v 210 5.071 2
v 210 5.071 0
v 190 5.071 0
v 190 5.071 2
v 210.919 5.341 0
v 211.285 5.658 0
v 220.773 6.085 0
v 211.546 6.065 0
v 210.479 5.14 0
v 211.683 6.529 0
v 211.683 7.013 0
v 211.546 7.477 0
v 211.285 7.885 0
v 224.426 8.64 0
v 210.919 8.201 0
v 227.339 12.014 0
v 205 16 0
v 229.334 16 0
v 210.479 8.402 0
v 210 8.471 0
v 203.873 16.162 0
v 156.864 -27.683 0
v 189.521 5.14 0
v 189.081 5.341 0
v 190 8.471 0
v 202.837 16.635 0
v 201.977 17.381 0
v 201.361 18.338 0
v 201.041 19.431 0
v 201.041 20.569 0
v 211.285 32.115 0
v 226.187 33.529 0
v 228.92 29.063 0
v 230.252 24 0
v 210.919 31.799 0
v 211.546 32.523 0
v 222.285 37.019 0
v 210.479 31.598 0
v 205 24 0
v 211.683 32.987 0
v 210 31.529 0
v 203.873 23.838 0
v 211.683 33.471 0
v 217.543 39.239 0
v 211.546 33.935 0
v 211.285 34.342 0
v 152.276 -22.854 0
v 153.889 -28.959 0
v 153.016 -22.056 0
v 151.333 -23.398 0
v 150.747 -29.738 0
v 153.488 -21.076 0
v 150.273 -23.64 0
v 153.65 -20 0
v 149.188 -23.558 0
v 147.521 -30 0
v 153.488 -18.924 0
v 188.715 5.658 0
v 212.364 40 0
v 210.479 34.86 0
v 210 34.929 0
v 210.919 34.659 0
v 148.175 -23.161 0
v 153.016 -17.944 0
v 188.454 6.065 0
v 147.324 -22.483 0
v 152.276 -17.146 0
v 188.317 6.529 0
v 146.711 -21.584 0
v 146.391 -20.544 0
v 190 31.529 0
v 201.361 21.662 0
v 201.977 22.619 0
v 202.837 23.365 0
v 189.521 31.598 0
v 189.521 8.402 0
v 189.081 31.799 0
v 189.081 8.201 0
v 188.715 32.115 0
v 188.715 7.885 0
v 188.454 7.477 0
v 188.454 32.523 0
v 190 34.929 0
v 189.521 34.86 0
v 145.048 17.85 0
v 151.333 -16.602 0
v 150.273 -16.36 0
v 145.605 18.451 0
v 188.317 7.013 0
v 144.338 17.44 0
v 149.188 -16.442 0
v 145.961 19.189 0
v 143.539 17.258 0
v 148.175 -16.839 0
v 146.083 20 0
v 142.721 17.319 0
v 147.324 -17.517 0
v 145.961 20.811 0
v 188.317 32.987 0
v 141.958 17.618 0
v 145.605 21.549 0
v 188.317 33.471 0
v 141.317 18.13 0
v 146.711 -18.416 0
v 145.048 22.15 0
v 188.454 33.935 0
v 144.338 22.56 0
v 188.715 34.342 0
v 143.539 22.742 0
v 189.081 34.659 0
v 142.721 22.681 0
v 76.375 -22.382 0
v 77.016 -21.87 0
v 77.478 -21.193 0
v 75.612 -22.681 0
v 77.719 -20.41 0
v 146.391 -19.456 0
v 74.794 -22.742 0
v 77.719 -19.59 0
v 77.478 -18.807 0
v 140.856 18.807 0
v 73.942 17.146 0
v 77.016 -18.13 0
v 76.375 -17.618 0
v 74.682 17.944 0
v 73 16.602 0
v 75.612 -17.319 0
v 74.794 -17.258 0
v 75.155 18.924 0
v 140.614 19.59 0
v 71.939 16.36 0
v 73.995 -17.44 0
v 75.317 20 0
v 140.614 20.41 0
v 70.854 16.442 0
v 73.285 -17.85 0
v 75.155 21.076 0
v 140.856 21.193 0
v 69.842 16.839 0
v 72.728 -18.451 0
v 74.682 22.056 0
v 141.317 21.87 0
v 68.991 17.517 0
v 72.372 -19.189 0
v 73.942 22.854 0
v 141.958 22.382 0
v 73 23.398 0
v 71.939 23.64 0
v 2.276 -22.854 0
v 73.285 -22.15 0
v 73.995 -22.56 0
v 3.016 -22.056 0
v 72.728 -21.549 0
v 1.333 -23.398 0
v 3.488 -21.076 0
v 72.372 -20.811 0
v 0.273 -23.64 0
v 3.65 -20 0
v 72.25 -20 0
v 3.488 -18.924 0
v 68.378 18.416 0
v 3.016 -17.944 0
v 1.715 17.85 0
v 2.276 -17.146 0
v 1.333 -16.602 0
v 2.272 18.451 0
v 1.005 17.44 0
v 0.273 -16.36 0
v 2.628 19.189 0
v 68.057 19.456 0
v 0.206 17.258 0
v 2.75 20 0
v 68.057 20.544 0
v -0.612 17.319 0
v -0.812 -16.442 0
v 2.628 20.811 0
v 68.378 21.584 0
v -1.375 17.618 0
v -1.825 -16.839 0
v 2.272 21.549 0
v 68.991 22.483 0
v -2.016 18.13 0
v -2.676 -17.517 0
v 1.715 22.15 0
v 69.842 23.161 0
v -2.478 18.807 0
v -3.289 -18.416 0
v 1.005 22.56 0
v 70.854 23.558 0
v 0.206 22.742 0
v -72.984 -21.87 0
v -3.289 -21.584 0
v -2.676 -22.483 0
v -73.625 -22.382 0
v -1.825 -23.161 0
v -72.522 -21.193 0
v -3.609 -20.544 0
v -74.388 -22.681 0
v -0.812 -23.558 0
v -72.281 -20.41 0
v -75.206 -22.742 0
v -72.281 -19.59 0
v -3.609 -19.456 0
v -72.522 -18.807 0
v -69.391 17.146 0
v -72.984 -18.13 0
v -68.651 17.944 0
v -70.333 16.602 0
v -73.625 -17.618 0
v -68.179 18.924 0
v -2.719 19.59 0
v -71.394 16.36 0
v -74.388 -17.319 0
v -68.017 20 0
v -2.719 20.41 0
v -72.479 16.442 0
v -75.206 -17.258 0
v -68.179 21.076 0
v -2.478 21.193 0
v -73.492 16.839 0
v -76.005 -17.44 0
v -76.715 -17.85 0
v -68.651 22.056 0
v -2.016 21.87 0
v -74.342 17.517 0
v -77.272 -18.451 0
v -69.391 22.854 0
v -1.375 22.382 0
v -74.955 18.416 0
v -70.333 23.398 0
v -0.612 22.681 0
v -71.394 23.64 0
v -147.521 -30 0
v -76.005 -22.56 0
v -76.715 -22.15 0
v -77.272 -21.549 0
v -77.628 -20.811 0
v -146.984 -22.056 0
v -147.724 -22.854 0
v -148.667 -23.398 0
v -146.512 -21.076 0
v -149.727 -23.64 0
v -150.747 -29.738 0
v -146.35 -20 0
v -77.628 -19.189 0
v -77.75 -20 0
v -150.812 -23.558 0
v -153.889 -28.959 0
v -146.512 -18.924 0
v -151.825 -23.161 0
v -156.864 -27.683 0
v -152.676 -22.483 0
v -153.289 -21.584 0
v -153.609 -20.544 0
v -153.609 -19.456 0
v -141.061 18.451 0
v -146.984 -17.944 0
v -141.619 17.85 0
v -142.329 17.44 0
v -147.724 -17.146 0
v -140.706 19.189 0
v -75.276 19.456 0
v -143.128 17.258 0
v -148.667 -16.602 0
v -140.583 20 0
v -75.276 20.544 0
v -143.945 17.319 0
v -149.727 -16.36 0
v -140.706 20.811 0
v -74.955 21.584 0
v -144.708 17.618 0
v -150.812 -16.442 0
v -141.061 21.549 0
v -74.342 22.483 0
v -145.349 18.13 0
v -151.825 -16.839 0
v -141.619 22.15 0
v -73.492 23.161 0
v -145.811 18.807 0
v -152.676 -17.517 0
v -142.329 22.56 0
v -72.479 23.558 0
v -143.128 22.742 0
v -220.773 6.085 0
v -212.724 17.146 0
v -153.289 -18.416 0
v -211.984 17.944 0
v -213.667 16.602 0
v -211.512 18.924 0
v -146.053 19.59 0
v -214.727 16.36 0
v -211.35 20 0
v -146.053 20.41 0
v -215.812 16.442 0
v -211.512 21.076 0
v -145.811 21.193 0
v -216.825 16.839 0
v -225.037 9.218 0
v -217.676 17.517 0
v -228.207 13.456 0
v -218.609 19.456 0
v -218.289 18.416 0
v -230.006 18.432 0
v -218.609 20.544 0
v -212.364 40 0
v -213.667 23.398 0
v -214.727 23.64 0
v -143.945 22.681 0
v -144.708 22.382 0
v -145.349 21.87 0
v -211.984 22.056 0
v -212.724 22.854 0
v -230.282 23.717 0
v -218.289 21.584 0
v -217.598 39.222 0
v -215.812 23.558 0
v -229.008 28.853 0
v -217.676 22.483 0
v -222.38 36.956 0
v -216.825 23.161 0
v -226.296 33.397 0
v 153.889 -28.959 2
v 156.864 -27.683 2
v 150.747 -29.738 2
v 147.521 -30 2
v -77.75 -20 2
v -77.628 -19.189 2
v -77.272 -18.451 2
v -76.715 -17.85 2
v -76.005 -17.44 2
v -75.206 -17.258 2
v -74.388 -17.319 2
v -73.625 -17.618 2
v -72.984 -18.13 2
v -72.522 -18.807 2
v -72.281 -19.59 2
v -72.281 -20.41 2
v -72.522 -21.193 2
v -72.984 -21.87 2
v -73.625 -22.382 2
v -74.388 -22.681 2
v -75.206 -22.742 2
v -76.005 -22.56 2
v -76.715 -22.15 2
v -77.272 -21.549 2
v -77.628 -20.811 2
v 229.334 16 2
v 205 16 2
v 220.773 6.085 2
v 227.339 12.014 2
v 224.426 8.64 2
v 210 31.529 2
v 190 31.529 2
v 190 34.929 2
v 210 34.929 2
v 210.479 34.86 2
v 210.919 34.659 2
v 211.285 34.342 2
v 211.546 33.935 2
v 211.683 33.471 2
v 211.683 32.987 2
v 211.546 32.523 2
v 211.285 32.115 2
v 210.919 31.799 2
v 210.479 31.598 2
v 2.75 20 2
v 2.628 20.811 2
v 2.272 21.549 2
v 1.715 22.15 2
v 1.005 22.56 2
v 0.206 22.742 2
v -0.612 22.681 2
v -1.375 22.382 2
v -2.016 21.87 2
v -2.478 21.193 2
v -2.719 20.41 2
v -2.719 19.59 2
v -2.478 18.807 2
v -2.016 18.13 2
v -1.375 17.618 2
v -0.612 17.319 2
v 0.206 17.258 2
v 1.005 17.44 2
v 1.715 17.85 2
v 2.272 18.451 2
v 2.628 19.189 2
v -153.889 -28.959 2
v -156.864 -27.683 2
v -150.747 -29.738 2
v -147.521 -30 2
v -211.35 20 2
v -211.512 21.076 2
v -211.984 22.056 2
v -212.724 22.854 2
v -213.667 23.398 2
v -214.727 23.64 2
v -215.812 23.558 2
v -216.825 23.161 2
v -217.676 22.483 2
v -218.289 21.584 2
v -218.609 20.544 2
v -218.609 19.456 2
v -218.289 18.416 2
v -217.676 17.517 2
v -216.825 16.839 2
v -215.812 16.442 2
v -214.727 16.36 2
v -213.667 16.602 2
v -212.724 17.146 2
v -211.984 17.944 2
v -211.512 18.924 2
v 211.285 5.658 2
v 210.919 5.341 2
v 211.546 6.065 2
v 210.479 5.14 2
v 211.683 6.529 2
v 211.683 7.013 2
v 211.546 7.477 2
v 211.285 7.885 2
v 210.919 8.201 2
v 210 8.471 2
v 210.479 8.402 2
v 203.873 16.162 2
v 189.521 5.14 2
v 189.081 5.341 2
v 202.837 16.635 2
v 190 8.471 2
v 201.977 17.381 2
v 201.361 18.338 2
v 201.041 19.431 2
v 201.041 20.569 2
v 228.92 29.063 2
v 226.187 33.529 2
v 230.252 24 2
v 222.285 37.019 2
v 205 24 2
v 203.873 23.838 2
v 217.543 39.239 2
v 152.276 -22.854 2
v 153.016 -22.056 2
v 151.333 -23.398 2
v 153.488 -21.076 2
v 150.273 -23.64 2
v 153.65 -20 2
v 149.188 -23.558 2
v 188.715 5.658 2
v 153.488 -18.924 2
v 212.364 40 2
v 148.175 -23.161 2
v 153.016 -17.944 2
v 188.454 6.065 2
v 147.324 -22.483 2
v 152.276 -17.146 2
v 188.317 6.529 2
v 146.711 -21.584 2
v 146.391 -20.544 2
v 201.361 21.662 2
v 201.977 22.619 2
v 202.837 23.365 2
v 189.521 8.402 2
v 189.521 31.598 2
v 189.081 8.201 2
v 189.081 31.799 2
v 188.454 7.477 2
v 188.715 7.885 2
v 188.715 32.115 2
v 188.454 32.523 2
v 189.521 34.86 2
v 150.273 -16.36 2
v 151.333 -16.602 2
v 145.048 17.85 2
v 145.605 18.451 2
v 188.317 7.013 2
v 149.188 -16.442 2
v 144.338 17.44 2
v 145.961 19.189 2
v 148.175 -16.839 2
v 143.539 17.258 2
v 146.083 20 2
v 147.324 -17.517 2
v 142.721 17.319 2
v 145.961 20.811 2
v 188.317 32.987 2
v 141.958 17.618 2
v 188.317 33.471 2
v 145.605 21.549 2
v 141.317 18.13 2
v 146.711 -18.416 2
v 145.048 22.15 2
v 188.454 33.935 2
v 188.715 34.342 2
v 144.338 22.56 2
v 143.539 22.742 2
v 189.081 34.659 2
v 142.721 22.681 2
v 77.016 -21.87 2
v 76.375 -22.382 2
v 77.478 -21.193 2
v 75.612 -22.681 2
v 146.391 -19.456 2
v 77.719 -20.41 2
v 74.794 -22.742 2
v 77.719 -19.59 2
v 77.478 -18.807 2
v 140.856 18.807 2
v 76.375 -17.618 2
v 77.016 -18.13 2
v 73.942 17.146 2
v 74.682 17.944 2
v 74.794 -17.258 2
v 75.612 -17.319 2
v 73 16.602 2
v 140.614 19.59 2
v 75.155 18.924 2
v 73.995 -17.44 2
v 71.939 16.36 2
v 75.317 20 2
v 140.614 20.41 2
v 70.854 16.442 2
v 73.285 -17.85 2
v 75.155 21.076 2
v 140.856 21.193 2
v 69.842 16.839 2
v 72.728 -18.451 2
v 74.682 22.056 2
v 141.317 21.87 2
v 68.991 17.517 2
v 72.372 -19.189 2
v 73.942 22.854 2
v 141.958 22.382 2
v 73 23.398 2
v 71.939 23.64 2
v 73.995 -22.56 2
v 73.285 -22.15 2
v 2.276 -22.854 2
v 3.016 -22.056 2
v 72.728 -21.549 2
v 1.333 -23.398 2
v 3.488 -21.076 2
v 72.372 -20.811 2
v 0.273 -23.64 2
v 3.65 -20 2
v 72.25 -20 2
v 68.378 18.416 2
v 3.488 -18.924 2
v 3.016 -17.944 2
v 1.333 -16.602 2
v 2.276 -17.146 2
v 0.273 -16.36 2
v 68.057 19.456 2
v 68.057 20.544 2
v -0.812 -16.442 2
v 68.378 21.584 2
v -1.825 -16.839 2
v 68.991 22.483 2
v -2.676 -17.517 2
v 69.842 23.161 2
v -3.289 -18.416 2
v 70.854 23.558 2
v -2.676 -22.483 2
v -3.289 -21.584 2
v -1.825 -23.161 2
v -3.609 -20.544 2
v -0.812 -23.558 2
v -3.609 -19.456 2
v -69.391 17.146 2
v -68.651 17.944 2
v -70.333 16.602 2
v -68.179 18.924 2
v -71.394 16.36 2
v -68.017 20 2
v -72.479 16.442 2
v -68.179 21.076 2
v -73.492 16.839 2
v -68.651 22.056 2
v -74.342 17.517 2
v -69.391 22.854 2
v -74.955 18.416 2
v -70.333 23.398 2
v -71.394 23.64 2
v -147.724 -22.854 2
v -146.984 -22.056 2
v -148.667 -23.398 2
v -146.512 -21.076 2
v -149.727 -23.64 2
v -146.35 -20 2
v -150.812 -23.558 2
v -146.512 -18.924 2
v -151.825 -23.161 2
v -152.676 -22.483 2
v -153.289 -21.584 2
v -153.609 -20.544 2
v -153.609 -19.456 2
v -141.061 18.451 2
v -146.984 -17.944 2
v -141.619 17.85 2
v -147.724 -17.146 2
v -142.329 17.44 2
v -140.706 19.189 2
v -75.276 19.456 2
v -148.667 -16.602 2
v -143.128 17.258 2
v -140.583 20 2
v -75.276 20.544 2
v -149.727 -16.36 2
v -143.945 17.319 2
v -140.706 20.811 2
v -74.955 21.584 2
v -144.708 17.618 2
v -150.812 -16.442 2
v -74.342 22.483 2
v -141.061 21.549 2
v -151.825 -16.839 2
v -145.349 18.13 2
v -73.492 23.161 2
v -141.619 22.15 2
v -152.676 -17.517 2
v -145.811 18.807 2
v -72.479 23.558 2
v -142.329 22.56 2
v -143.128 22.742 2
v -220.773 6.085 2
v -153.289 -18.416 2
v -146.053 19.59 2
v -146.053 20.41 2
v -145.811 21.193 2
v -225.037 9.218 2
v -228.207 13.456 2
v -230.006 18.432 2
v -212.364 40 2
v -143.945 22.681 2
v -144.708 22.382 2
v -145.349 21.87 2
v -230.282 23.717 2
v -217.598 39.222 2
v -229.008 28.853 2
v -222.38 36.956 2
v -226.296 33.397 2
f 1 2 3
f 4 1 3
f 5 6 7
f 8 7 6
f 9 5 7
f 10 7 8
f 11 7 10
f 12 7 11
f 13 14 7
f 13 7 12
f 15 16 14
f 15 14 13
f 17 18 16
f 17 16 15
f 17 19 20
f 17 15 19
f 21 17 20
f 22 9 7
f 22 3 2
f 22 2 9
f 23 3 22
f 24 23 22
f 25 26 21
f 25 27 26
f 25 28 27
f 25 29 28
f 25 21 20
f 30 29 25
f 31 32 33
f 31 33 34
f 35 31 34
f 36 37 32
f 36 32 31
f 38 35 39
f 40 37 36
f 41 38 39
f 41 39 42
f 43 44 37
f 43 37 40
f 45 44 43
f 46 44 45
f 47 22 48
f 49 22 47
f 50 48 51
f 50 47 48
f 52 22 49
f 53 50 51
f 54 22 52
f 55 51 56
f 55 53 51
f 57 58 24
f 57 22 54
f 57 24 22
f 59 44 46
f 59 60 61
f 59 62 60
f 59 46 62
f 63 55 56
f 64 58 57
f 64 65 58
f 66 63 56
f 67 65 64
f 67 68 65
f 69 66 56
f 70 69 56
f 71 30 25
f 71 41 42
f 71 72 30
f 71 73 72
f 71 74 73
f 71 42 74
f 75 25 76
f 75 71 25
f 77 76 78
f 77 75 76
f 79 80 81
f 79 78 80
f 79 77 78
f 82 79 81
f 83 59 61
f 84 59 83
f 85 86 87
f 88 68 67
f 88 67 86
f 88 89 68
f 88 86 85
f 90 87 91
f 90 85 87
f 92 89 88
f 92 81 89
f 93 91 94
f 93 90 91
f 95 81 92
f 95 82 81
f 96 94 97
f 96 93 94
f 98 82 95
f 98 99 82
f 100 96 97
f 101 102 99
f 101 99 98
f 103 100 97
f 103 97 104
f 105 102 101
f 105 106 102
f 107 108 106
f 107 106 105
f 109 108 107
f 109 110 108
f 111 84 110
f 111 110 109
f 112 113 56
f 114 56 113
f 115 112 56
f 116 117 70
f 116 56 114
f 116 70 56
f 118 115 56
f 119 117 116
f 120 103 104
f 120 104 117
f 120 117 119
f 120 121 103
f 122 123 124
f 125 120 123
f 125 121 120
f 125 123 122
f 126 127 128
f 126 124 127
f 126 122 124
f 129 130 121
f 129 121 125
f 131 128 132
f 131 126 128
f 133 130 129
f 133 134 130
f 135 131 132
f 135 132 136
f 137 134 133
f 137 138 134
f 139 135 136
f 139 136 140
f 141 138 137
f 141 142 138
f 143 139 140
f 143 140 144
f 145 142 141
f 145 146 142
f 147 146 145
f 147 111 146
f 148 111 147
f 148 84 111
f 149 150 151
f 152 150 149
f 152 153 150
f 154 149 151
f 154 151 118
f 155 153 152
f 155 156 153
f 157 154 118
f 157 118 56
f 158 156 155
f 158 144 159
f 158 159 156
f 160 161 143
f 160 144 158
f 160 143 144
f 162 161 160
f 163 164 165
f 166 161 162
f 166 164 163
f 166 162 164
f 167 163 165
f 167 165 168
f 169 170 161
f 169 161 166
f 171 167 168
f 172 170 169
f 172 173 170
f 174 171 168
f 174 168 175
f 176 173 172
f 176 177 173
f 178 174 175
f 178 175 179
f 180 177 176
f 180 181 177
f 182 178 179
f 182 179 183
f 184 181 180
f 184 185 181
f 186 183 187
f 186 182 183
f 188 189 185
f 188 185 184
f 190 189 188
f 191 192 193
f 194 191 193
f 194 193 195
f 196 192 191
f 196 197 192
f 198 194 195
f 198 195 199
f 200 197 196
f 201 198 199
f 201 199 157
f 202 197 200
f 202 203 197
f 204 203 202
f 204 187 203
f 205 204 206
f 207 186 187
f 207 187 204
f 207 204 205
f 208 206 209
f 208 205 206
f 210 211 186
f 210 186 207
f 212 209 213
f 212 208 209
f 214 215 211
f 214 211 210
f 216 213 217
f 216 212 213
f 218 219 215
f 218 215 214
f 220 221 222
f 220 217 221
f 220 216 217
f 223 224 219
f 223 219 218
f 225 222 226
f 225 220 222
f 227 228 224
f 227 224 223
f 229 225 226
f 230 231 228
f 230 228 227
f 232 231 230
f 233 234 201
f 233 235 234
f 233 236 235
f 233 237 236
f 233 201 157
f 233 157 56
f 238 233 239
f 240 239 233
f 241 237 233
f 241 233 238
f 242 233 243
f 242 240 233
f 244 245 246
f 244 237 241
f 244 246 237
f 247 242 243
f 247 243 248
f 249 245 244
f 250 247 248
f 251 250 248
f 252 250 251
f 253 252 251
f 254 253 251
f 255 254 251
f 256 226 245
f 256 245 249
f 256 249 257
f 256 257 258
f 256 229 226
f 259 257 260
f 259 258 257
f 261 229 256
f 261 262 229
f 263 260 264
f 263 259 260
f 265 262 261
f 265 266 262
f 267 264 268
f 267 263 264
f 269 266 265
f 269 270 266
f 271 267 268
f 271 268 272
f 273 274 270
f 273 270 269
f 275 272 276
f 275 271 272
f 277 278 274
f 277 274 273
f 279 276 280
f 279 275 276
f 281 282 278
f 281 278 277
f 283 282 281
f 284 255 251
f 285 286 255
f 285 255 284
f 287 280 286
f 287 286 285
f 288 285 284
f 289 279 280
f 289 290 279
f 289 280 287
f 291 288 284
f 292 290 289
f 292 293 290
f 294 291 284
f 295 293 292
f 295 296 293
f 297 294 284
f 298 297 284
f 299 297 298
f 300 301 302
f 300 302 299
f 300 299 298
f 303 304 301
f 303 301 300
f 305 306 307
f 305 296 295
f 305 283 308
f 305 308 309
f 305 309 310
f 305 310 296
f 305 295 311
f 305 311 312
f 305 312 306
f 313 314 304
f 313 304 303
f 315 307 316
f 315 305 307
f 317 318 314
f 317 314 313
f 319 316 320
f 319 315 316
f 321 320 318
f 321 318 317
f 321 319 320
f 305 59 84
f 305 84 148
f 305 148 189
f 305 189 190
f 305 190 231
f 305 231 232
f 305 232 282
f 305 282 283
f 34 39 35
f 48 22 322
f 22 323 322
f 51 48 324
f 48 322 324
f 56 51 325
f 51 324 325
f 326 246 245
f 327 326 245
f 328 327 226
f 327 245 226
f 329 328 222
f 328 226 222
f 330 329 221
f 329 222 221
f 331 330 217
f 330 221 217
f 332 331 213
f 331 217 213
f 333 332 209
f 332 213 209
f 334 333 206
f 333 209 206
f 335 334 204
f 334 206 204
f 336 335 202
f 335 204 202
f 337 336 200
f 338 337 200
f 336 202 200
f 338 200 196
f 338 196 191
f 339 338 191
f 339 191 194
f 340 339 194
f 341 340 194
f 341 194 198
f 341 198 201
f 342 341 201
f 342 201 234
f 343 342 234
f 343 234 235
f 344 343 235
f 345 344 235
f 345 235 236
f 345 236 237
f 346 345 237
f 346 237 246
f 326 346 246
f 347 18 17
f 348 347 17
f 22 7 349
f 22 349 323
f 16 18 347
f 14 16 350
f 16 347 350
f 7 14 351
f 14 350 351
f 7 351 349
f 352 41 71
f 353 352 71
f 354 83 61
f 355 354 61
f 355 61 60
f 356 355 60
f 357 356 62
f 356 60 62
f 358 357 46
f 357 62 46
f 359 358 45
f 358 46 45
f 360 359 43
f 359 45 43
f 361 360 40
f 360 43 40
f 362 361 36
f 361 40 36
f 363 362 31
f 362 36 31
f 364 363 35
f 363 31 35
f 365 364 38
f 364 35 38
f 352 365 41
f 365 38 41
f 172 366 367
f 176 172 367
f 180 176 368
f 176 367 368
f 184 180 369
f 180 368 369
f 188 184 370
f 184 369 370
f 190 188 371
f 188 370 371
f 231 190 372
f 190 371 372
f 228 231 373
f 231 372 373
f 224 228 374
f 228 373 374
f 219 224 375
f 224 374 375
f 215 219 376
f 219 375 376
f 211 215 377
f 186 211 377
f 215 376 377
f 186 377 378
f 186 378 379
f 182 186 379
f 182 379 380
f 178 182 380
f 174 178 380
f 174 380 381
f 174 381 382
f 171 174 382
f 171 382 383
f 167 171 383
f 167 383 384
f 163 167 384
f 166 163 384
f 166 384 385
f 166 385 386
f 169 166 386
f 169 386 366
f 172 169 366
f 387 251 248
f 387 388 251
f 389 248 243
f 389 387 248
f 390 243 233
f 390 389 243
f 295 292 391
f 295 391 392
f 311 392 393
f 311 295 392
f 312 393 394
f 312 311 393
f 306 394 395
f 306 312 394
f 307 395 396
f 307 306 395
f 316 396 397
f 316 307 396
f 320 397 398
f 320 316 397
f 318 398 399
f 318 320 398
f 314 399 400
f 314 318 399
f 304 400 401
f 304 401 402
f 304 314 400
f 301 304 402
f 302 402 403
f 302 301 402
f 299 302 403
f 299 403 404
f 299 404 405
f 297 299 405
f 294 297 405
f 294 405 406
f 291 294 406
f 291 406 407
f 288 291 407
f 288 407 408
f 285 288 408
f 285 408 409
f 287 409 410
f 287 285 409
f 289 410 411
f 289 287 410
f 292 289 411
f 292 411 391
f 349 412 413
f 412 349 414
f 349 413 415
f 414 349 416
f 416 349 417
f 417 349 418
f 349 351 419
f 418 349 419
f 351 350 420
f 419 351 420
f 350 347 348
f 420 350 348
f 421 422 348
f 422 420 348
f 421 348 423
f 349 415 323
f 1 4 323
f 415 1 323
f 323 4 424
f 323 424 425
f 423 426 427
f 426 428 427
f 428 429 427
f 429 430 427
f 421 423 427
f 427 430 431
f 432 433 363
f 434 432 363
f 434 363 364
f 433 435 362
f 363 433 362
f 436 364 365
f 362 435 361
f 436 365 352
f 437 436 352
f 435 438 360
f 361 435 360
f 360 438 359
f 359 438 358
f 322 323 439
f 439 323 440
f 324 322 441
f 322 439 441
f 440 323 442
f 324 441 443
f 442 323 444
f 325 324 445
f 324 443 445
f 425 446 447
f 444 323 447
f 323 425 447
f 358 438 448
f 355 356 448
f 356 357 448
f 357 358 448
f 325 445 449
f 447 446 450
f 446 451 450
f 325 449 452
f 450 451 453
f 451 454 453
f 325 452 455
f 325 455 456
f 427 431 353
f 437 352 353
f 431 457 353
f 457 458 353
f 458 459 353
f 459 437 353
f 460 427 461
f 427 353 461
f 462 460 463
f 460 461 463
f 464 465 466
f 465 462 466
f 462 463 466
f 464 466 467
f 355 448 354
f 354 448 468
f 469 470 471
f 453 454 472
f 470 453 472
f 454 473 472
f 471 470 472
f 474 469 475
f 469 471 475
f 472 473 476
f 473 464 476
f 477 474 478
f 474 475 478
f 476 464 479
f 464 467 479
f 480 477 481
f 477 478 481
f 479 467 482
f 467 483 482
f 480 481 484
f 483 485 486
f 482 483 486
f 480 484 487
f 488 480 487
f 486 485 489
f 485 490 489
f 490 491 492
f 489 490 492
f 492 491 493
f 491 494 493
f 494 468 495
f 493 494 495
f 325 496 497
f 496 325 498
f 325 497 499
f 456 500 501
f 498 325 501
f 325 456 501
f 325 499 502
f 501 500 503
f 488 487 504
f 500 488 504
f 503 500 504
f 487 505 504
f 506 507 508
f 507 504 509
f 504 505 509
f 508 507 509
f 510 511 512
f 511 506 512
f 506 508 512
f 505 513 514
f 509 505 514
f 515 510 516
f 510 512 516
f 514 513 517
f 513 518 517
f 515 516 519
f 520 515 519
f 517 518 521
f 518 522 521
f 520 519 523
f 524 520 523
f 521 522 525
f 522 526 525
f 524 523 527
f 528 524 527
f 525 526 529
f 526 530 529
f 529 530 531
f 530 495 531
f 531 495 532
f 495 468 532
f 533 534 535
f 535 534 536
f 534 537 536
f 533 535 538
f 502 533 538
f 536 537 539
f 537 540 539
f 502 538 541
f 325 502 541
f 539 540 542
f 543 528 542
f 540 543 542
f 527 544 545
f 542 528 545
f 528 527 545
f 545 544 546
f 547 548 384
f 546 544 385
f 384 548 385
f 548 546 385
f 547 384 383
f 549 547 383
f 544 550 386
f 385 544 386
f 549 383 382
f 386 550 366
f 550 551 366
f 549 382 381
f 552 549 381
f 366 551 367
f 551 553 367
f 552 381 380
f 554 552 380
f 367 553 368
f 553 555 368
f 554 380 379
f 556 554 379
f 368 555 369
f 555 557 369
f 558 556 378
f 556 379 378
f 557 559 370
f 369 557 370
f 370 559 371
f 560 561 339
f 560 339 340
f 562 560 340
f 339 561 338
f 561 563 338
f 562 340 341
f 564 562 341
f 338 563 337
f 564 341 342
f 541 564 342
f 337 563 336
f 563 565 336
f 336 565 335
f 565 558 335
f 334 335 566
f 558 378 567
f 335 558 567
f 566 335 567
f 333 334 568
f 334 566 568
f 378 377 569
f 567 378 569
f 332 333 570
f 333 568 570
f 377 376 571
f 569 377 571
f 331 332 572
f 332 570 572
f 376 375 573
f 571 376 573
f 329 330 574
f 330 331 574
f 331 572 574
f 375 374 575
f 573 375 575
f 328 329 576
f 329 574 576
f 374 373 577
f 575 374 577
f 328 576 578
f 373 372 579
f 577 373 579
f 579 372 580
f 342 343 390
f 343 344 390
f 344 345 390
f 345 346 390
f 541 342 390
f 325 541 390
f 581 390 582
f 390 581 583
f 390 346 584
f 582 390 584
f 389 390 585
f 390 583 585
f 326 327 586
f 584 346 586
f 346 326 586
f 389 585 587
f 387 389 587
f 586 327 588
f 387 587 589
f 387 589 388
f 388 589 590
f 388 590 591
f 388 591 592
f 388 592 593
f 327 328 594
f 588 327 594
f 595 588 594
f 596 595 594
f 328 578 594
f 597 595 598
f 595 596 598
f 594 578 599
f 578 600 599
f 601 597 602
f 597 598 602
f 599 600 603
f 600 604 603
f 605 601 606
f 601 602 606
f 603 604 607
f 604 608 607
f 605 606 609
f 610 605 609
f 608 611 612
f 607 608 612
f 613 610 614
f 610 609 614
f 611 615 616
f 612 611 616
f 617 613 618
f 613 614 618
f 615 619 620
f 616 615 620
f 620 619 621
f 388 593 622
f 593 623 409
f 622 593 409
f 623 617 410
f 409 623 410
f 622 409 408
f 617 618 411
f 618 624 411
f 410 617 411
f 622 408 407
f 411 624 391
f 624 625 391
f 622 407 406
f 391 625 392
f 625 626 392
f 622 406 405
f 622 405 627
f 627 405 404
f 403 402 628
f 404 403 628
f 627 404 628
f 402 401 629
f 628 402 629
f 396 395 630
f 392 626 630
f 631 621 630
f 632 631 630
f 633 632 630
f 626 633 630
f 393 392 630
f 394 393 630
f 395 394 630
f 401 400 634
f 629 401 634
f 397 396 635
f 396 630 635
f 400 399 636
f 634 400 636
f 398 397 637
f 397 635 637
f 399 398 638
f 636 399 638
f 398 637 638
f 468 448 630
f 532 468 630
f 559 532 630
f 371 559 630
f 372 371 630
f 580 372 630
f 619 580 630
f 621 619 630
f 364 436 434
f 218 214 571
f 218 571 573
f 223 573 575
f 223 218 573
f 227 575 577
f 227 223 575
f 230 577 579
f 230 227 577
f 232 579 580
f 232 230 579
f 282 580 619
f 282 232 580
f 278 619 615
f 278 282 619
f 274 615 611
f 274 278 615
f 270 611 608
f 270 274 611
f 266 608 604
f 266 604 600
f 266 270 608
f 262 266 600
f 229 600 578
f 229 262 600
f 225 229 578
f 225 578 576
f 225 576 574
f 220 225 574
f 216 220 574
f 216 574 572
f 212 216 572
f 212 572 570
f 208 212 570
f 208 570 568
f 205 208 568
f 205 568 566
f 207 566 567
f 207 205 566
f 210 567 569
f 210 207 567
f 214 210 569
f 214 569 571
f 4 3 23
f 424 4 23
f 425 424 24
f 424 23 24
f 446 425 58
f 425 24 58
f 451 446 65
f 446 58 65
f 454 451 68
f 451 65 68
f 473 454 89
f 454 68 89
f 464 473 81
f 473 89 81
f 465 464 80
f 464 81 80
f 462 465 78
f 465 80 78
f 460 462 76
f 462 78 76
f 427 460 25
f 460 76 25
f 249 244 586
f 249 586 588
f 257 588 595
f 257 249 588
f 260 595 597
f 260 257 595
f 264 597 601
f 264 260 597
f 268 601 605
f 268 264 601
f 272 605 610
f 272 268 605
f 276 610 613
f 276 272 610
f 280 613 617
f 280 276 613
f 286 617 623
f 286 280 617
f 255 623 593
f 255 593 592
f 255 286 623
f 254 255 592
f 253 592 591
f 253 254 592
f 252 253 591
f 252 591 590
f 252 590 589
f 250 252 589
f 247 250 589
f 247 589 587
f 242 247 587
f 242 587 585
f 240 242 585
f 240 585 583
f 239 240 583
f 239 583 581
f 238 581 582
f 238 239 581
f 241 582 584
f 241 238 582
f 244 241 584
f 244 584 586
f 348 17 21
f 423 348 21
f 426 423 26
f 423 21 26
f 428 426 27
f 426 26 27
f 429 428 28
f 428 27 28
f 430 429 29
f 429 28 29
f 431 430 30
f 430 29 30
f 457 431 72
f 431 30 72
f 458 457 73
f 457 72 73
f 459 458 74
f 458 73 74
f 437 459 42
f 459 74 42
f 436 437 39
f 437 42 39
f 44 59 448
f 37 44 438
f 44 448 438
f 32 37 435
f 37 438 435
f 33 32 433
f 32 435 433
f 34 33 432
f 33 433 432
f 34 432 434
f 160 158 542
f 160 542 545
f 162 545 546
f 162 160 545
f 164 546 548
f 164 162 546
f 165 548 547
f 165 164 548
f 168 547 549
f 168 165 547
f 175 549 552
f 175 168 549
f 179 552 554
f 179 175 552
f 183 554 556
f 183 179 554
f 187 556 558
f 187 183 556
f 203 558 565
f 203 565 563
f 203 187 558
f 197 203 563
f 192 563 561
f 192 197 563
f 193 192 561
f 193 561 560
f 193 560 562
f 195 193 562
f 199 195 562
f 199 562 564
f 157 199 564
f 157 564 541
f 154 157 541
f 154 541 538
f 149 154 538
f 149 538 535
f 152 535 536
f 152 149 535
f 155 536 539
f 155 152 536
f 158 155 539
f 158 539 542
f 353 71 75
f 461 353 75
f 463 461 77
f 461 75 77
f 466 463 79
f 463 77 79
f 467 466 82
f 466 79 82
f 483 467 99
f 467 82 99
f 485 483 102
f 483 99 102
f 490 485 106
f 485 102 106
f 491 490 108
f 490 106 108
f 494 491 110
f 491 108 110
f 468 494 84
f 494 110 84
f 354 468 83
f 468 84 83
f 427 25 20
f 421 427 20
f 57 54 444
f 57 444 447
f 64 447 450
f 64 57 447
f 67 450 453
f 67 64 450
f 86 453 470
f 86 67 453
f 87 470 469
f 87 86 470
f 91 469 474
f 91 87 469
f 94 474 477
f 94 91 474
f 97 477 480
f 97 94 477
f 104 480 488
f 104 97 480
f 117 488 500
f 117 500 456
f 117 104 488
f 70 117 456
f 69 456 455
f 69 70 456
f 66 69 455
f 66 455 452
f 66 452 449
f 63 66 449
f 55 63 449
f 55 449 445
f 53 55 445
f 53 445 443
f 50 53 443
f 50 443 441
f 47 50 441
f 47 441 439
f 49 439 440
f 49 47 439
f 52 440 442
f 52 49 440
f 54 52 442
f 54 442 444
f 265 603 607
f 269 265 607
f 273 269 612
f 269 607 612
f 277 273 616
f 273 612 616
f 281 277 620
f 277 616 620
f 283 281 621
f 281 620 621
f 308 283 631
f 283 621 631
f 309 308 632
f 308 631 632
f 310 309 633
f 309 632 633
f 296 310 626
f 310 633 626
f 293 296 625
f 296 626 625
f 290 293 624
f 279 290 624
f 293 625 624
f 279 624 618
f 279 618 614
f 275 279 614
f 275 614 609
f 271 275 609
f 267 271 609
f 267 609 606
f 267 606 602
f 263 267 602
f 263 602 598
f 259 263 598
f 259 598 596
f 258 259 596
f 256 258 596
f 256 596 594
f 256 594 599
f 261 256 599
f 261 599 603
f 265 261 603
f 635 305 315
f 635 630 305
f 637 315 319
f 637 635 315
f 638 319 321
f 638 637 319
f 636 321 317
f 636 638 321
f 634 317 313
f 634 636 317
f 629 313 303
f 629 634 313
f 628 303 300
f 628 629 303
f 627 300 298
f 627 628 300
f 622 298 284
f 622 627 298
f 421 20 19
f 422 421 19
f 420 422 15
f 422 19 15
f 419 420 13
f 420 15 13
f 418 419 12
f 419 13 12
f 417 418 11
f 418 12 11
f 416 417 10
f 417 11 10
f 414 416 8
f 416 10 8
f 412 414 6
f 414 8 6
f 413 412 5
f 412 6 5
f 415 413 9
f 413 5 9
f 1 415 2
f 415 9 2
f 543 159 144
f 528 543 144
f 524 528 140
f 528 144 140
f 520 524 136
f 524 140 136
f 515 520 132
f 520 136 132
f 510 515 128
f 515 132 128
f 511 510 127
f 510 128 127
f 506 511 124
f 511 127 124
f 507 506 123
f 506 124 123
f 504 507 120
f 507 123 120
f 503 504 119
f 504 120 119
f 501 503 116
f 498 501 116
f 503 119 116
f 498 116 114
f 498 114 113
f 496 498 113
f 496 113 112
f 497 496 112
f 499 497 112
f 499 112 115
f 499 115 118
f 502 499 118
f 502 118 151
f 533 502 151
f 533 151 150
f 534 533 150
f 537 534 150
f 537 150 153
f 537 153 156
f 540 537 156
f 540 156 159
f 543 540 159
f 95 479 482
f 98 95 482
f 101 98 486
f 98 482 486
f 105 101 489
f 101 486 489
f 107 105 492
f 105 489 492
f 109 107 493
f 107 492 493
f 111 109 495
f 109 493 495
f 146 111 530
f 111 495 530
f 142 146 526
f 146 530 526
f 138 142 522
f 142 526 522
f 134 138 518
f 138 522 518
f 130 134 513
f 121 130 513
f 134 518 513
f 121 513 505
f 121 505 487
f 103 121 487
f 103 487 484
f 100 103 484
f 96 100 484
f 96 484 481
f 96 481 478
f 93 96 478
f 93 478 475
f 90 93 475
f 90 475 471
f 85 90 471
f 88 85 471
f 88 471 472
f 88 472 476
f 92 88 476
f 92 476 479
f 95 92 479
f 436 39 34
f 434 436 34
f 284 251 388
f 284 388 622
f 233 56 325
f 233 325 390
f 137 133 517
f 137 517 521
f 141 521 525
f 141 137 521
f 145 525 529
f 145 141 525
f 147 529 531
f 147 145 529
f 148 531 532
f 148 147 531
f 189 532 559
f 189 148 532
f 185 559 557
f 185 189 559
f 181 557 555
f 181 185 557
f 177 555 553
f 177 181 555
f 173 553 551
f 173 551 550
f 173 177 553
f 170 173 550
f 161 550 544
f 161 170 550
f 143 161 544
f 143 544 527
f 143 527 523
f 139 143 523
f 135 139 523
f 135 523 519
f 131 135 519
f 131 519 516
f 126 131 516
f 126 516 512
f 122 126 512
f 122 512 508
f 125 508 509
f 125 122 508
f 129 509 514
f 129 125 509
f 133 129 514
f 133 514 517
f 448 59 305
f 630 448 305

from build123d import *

# Parameters (mm, degrees)
ESQUISSE1_R             = 3.65
BOSS_EXTRU_1_DEPTH      = 2
CONG_1_R                = 18
CONG_2_R                = 20
D_GAGEMENT_M31_D        = 3.4
ENL_V_MAT_EXTRU_1_DEPTH = 234.819122898
D_GAGEMENT_M51_D        = 5.5
D_GAGEMENT_M52_D        = 5.5


with BuildPart() as part:
    # Esquisse1 → Boss.-Extru.1 (new body)
    with BuildSketch(Plane.XY):
        Polygon((-284.958991582, 40), (-150, 40), (150, 40), (284.958991582, 40), (152.479495791, -30), (-152.479495791, -30), align=None)
        with Locations((-215, 20)):
            Circle(ESQUISSE1_R, mode=Mode.SUBTRACT)
        with Locations((-150, -20)):
            Circle(ESQUISSE1_R, mode=Mode.SUBTRACT)
        with Locations((150, -20)):
            Circle(ESQUISSE1_R, mode=Mode.SUBTRACT)
        with Locations((215, 20)):
            Circle(ESQUISSE1_R, mode=Mode.SUBTRACT)
        with Locations((0, -20)):
            Circle(ESQUISSE1_R, mode=Mode.SUBTRACT)
        with Locations((-71.666666667, 20)):
            Circle(ESQUISSE1_R, mode=Mode.SUBTRACT)
        with Locations((71.666666667, 20)):
            Circle(ESQUISSE1_R, mode=Mode.SUBTRACT)
    extrude(amount=BOSS_EXTRU_1_DEPTH)

    # Congé1
    cong_1_edges = [part.edges().sort_by_distance(p)[0] for p in [
        (-284.958991582, 40, 1),
        (284.958991582, 40, 1),
    ]]
    fillet(cong_1_edges, radius=CONG_1_R)

    # Congé2
    cong_2_edges = [part.edges().sort_by_distance(p)[0] for p in [
        (152.479495791, -30, 1),
        (-152.479495791, -30, 1),
    ]]
    fillet(cong_2_edges, radius=CONG_2_R)

    # Dégagement M31 (through all)
    with Locations(Plane(origin=(0, 0, 0), x_dir=(-1, 0, 0), z_dir=(0, 0, -1))):
        with Locations((-200, 33.228756555), (-200, 6.771243445)):
            Hole(D_GAGEMENT_M31_D / 2)

    # Esquisse4 → Enlèv. mat.-Extru.1 (cut, through all)
    with BuildSketch(Plane(origin=(0, 0, 0), x_dir=(-1, 0, 0), z_dir=(0, 0, -1))):
        with BuildLine():
            Line((-229.334149786, 16), (-205, 16))
            ThreePointArc((-205, 16), (-201, 20), (-205, 24))
            Line((-205, 24), (-230.252130857, 24))
            ThreePointArc((-230.252130857, 24), (-230.246241418, 19.948007721), (-229.334149786, 16))
        make_face()
        with BuildLine():
            Line((-210, 31.528756555), (-190, 31.528756555))
            ThreePointArc((-190, 31.528756555), (-188.3, 33.228756555), (-190, 34.928756555))
            Line((-190, 34.928756555), (-210, 34.928756555))
            ThreePointArc((-210, 34.928756555), (-211.7, 33.228756555), (-210, 31.528756555))
        make_face()
        with BuildLine():
            Line((-210, 5.071243445), (-190, 5.071243445))
            ThreePointArc((-190, 5.071243445), (-188.3, 6.771243445), (-190, 8.471243445))
            Line((-190, 8.471243445), (-210, 8.471243445))
            ThreePointArc((-210, 8.471243445), (-211.7, 6.771243445), (-210, 5.071243445))
        make_face()
    extrude(amount=-ENL_V_MAT_EXTRU_1_DEPTH, mode=Mode.SUBTRACT)

    # Dégagement M51 (through all)
    with Locations(Plane(origin=(0, 0, 0), x_dir=(-1, 0, 0), z_dir=(0, 0, -1))):
        with Locations((143.333333333, 20), (0, 20), (-143.333333333, 20)):
            Hole(D_GAGEMENT_M51_D / 2)

    # Dégagement M52 (through all)
    with Locations(Plane.XY.offset(2)):
        with Locations((-75, -20), (75, -20)):
            Hole(D_GAGEMENT_M52_D / 2)


solid = part.part
